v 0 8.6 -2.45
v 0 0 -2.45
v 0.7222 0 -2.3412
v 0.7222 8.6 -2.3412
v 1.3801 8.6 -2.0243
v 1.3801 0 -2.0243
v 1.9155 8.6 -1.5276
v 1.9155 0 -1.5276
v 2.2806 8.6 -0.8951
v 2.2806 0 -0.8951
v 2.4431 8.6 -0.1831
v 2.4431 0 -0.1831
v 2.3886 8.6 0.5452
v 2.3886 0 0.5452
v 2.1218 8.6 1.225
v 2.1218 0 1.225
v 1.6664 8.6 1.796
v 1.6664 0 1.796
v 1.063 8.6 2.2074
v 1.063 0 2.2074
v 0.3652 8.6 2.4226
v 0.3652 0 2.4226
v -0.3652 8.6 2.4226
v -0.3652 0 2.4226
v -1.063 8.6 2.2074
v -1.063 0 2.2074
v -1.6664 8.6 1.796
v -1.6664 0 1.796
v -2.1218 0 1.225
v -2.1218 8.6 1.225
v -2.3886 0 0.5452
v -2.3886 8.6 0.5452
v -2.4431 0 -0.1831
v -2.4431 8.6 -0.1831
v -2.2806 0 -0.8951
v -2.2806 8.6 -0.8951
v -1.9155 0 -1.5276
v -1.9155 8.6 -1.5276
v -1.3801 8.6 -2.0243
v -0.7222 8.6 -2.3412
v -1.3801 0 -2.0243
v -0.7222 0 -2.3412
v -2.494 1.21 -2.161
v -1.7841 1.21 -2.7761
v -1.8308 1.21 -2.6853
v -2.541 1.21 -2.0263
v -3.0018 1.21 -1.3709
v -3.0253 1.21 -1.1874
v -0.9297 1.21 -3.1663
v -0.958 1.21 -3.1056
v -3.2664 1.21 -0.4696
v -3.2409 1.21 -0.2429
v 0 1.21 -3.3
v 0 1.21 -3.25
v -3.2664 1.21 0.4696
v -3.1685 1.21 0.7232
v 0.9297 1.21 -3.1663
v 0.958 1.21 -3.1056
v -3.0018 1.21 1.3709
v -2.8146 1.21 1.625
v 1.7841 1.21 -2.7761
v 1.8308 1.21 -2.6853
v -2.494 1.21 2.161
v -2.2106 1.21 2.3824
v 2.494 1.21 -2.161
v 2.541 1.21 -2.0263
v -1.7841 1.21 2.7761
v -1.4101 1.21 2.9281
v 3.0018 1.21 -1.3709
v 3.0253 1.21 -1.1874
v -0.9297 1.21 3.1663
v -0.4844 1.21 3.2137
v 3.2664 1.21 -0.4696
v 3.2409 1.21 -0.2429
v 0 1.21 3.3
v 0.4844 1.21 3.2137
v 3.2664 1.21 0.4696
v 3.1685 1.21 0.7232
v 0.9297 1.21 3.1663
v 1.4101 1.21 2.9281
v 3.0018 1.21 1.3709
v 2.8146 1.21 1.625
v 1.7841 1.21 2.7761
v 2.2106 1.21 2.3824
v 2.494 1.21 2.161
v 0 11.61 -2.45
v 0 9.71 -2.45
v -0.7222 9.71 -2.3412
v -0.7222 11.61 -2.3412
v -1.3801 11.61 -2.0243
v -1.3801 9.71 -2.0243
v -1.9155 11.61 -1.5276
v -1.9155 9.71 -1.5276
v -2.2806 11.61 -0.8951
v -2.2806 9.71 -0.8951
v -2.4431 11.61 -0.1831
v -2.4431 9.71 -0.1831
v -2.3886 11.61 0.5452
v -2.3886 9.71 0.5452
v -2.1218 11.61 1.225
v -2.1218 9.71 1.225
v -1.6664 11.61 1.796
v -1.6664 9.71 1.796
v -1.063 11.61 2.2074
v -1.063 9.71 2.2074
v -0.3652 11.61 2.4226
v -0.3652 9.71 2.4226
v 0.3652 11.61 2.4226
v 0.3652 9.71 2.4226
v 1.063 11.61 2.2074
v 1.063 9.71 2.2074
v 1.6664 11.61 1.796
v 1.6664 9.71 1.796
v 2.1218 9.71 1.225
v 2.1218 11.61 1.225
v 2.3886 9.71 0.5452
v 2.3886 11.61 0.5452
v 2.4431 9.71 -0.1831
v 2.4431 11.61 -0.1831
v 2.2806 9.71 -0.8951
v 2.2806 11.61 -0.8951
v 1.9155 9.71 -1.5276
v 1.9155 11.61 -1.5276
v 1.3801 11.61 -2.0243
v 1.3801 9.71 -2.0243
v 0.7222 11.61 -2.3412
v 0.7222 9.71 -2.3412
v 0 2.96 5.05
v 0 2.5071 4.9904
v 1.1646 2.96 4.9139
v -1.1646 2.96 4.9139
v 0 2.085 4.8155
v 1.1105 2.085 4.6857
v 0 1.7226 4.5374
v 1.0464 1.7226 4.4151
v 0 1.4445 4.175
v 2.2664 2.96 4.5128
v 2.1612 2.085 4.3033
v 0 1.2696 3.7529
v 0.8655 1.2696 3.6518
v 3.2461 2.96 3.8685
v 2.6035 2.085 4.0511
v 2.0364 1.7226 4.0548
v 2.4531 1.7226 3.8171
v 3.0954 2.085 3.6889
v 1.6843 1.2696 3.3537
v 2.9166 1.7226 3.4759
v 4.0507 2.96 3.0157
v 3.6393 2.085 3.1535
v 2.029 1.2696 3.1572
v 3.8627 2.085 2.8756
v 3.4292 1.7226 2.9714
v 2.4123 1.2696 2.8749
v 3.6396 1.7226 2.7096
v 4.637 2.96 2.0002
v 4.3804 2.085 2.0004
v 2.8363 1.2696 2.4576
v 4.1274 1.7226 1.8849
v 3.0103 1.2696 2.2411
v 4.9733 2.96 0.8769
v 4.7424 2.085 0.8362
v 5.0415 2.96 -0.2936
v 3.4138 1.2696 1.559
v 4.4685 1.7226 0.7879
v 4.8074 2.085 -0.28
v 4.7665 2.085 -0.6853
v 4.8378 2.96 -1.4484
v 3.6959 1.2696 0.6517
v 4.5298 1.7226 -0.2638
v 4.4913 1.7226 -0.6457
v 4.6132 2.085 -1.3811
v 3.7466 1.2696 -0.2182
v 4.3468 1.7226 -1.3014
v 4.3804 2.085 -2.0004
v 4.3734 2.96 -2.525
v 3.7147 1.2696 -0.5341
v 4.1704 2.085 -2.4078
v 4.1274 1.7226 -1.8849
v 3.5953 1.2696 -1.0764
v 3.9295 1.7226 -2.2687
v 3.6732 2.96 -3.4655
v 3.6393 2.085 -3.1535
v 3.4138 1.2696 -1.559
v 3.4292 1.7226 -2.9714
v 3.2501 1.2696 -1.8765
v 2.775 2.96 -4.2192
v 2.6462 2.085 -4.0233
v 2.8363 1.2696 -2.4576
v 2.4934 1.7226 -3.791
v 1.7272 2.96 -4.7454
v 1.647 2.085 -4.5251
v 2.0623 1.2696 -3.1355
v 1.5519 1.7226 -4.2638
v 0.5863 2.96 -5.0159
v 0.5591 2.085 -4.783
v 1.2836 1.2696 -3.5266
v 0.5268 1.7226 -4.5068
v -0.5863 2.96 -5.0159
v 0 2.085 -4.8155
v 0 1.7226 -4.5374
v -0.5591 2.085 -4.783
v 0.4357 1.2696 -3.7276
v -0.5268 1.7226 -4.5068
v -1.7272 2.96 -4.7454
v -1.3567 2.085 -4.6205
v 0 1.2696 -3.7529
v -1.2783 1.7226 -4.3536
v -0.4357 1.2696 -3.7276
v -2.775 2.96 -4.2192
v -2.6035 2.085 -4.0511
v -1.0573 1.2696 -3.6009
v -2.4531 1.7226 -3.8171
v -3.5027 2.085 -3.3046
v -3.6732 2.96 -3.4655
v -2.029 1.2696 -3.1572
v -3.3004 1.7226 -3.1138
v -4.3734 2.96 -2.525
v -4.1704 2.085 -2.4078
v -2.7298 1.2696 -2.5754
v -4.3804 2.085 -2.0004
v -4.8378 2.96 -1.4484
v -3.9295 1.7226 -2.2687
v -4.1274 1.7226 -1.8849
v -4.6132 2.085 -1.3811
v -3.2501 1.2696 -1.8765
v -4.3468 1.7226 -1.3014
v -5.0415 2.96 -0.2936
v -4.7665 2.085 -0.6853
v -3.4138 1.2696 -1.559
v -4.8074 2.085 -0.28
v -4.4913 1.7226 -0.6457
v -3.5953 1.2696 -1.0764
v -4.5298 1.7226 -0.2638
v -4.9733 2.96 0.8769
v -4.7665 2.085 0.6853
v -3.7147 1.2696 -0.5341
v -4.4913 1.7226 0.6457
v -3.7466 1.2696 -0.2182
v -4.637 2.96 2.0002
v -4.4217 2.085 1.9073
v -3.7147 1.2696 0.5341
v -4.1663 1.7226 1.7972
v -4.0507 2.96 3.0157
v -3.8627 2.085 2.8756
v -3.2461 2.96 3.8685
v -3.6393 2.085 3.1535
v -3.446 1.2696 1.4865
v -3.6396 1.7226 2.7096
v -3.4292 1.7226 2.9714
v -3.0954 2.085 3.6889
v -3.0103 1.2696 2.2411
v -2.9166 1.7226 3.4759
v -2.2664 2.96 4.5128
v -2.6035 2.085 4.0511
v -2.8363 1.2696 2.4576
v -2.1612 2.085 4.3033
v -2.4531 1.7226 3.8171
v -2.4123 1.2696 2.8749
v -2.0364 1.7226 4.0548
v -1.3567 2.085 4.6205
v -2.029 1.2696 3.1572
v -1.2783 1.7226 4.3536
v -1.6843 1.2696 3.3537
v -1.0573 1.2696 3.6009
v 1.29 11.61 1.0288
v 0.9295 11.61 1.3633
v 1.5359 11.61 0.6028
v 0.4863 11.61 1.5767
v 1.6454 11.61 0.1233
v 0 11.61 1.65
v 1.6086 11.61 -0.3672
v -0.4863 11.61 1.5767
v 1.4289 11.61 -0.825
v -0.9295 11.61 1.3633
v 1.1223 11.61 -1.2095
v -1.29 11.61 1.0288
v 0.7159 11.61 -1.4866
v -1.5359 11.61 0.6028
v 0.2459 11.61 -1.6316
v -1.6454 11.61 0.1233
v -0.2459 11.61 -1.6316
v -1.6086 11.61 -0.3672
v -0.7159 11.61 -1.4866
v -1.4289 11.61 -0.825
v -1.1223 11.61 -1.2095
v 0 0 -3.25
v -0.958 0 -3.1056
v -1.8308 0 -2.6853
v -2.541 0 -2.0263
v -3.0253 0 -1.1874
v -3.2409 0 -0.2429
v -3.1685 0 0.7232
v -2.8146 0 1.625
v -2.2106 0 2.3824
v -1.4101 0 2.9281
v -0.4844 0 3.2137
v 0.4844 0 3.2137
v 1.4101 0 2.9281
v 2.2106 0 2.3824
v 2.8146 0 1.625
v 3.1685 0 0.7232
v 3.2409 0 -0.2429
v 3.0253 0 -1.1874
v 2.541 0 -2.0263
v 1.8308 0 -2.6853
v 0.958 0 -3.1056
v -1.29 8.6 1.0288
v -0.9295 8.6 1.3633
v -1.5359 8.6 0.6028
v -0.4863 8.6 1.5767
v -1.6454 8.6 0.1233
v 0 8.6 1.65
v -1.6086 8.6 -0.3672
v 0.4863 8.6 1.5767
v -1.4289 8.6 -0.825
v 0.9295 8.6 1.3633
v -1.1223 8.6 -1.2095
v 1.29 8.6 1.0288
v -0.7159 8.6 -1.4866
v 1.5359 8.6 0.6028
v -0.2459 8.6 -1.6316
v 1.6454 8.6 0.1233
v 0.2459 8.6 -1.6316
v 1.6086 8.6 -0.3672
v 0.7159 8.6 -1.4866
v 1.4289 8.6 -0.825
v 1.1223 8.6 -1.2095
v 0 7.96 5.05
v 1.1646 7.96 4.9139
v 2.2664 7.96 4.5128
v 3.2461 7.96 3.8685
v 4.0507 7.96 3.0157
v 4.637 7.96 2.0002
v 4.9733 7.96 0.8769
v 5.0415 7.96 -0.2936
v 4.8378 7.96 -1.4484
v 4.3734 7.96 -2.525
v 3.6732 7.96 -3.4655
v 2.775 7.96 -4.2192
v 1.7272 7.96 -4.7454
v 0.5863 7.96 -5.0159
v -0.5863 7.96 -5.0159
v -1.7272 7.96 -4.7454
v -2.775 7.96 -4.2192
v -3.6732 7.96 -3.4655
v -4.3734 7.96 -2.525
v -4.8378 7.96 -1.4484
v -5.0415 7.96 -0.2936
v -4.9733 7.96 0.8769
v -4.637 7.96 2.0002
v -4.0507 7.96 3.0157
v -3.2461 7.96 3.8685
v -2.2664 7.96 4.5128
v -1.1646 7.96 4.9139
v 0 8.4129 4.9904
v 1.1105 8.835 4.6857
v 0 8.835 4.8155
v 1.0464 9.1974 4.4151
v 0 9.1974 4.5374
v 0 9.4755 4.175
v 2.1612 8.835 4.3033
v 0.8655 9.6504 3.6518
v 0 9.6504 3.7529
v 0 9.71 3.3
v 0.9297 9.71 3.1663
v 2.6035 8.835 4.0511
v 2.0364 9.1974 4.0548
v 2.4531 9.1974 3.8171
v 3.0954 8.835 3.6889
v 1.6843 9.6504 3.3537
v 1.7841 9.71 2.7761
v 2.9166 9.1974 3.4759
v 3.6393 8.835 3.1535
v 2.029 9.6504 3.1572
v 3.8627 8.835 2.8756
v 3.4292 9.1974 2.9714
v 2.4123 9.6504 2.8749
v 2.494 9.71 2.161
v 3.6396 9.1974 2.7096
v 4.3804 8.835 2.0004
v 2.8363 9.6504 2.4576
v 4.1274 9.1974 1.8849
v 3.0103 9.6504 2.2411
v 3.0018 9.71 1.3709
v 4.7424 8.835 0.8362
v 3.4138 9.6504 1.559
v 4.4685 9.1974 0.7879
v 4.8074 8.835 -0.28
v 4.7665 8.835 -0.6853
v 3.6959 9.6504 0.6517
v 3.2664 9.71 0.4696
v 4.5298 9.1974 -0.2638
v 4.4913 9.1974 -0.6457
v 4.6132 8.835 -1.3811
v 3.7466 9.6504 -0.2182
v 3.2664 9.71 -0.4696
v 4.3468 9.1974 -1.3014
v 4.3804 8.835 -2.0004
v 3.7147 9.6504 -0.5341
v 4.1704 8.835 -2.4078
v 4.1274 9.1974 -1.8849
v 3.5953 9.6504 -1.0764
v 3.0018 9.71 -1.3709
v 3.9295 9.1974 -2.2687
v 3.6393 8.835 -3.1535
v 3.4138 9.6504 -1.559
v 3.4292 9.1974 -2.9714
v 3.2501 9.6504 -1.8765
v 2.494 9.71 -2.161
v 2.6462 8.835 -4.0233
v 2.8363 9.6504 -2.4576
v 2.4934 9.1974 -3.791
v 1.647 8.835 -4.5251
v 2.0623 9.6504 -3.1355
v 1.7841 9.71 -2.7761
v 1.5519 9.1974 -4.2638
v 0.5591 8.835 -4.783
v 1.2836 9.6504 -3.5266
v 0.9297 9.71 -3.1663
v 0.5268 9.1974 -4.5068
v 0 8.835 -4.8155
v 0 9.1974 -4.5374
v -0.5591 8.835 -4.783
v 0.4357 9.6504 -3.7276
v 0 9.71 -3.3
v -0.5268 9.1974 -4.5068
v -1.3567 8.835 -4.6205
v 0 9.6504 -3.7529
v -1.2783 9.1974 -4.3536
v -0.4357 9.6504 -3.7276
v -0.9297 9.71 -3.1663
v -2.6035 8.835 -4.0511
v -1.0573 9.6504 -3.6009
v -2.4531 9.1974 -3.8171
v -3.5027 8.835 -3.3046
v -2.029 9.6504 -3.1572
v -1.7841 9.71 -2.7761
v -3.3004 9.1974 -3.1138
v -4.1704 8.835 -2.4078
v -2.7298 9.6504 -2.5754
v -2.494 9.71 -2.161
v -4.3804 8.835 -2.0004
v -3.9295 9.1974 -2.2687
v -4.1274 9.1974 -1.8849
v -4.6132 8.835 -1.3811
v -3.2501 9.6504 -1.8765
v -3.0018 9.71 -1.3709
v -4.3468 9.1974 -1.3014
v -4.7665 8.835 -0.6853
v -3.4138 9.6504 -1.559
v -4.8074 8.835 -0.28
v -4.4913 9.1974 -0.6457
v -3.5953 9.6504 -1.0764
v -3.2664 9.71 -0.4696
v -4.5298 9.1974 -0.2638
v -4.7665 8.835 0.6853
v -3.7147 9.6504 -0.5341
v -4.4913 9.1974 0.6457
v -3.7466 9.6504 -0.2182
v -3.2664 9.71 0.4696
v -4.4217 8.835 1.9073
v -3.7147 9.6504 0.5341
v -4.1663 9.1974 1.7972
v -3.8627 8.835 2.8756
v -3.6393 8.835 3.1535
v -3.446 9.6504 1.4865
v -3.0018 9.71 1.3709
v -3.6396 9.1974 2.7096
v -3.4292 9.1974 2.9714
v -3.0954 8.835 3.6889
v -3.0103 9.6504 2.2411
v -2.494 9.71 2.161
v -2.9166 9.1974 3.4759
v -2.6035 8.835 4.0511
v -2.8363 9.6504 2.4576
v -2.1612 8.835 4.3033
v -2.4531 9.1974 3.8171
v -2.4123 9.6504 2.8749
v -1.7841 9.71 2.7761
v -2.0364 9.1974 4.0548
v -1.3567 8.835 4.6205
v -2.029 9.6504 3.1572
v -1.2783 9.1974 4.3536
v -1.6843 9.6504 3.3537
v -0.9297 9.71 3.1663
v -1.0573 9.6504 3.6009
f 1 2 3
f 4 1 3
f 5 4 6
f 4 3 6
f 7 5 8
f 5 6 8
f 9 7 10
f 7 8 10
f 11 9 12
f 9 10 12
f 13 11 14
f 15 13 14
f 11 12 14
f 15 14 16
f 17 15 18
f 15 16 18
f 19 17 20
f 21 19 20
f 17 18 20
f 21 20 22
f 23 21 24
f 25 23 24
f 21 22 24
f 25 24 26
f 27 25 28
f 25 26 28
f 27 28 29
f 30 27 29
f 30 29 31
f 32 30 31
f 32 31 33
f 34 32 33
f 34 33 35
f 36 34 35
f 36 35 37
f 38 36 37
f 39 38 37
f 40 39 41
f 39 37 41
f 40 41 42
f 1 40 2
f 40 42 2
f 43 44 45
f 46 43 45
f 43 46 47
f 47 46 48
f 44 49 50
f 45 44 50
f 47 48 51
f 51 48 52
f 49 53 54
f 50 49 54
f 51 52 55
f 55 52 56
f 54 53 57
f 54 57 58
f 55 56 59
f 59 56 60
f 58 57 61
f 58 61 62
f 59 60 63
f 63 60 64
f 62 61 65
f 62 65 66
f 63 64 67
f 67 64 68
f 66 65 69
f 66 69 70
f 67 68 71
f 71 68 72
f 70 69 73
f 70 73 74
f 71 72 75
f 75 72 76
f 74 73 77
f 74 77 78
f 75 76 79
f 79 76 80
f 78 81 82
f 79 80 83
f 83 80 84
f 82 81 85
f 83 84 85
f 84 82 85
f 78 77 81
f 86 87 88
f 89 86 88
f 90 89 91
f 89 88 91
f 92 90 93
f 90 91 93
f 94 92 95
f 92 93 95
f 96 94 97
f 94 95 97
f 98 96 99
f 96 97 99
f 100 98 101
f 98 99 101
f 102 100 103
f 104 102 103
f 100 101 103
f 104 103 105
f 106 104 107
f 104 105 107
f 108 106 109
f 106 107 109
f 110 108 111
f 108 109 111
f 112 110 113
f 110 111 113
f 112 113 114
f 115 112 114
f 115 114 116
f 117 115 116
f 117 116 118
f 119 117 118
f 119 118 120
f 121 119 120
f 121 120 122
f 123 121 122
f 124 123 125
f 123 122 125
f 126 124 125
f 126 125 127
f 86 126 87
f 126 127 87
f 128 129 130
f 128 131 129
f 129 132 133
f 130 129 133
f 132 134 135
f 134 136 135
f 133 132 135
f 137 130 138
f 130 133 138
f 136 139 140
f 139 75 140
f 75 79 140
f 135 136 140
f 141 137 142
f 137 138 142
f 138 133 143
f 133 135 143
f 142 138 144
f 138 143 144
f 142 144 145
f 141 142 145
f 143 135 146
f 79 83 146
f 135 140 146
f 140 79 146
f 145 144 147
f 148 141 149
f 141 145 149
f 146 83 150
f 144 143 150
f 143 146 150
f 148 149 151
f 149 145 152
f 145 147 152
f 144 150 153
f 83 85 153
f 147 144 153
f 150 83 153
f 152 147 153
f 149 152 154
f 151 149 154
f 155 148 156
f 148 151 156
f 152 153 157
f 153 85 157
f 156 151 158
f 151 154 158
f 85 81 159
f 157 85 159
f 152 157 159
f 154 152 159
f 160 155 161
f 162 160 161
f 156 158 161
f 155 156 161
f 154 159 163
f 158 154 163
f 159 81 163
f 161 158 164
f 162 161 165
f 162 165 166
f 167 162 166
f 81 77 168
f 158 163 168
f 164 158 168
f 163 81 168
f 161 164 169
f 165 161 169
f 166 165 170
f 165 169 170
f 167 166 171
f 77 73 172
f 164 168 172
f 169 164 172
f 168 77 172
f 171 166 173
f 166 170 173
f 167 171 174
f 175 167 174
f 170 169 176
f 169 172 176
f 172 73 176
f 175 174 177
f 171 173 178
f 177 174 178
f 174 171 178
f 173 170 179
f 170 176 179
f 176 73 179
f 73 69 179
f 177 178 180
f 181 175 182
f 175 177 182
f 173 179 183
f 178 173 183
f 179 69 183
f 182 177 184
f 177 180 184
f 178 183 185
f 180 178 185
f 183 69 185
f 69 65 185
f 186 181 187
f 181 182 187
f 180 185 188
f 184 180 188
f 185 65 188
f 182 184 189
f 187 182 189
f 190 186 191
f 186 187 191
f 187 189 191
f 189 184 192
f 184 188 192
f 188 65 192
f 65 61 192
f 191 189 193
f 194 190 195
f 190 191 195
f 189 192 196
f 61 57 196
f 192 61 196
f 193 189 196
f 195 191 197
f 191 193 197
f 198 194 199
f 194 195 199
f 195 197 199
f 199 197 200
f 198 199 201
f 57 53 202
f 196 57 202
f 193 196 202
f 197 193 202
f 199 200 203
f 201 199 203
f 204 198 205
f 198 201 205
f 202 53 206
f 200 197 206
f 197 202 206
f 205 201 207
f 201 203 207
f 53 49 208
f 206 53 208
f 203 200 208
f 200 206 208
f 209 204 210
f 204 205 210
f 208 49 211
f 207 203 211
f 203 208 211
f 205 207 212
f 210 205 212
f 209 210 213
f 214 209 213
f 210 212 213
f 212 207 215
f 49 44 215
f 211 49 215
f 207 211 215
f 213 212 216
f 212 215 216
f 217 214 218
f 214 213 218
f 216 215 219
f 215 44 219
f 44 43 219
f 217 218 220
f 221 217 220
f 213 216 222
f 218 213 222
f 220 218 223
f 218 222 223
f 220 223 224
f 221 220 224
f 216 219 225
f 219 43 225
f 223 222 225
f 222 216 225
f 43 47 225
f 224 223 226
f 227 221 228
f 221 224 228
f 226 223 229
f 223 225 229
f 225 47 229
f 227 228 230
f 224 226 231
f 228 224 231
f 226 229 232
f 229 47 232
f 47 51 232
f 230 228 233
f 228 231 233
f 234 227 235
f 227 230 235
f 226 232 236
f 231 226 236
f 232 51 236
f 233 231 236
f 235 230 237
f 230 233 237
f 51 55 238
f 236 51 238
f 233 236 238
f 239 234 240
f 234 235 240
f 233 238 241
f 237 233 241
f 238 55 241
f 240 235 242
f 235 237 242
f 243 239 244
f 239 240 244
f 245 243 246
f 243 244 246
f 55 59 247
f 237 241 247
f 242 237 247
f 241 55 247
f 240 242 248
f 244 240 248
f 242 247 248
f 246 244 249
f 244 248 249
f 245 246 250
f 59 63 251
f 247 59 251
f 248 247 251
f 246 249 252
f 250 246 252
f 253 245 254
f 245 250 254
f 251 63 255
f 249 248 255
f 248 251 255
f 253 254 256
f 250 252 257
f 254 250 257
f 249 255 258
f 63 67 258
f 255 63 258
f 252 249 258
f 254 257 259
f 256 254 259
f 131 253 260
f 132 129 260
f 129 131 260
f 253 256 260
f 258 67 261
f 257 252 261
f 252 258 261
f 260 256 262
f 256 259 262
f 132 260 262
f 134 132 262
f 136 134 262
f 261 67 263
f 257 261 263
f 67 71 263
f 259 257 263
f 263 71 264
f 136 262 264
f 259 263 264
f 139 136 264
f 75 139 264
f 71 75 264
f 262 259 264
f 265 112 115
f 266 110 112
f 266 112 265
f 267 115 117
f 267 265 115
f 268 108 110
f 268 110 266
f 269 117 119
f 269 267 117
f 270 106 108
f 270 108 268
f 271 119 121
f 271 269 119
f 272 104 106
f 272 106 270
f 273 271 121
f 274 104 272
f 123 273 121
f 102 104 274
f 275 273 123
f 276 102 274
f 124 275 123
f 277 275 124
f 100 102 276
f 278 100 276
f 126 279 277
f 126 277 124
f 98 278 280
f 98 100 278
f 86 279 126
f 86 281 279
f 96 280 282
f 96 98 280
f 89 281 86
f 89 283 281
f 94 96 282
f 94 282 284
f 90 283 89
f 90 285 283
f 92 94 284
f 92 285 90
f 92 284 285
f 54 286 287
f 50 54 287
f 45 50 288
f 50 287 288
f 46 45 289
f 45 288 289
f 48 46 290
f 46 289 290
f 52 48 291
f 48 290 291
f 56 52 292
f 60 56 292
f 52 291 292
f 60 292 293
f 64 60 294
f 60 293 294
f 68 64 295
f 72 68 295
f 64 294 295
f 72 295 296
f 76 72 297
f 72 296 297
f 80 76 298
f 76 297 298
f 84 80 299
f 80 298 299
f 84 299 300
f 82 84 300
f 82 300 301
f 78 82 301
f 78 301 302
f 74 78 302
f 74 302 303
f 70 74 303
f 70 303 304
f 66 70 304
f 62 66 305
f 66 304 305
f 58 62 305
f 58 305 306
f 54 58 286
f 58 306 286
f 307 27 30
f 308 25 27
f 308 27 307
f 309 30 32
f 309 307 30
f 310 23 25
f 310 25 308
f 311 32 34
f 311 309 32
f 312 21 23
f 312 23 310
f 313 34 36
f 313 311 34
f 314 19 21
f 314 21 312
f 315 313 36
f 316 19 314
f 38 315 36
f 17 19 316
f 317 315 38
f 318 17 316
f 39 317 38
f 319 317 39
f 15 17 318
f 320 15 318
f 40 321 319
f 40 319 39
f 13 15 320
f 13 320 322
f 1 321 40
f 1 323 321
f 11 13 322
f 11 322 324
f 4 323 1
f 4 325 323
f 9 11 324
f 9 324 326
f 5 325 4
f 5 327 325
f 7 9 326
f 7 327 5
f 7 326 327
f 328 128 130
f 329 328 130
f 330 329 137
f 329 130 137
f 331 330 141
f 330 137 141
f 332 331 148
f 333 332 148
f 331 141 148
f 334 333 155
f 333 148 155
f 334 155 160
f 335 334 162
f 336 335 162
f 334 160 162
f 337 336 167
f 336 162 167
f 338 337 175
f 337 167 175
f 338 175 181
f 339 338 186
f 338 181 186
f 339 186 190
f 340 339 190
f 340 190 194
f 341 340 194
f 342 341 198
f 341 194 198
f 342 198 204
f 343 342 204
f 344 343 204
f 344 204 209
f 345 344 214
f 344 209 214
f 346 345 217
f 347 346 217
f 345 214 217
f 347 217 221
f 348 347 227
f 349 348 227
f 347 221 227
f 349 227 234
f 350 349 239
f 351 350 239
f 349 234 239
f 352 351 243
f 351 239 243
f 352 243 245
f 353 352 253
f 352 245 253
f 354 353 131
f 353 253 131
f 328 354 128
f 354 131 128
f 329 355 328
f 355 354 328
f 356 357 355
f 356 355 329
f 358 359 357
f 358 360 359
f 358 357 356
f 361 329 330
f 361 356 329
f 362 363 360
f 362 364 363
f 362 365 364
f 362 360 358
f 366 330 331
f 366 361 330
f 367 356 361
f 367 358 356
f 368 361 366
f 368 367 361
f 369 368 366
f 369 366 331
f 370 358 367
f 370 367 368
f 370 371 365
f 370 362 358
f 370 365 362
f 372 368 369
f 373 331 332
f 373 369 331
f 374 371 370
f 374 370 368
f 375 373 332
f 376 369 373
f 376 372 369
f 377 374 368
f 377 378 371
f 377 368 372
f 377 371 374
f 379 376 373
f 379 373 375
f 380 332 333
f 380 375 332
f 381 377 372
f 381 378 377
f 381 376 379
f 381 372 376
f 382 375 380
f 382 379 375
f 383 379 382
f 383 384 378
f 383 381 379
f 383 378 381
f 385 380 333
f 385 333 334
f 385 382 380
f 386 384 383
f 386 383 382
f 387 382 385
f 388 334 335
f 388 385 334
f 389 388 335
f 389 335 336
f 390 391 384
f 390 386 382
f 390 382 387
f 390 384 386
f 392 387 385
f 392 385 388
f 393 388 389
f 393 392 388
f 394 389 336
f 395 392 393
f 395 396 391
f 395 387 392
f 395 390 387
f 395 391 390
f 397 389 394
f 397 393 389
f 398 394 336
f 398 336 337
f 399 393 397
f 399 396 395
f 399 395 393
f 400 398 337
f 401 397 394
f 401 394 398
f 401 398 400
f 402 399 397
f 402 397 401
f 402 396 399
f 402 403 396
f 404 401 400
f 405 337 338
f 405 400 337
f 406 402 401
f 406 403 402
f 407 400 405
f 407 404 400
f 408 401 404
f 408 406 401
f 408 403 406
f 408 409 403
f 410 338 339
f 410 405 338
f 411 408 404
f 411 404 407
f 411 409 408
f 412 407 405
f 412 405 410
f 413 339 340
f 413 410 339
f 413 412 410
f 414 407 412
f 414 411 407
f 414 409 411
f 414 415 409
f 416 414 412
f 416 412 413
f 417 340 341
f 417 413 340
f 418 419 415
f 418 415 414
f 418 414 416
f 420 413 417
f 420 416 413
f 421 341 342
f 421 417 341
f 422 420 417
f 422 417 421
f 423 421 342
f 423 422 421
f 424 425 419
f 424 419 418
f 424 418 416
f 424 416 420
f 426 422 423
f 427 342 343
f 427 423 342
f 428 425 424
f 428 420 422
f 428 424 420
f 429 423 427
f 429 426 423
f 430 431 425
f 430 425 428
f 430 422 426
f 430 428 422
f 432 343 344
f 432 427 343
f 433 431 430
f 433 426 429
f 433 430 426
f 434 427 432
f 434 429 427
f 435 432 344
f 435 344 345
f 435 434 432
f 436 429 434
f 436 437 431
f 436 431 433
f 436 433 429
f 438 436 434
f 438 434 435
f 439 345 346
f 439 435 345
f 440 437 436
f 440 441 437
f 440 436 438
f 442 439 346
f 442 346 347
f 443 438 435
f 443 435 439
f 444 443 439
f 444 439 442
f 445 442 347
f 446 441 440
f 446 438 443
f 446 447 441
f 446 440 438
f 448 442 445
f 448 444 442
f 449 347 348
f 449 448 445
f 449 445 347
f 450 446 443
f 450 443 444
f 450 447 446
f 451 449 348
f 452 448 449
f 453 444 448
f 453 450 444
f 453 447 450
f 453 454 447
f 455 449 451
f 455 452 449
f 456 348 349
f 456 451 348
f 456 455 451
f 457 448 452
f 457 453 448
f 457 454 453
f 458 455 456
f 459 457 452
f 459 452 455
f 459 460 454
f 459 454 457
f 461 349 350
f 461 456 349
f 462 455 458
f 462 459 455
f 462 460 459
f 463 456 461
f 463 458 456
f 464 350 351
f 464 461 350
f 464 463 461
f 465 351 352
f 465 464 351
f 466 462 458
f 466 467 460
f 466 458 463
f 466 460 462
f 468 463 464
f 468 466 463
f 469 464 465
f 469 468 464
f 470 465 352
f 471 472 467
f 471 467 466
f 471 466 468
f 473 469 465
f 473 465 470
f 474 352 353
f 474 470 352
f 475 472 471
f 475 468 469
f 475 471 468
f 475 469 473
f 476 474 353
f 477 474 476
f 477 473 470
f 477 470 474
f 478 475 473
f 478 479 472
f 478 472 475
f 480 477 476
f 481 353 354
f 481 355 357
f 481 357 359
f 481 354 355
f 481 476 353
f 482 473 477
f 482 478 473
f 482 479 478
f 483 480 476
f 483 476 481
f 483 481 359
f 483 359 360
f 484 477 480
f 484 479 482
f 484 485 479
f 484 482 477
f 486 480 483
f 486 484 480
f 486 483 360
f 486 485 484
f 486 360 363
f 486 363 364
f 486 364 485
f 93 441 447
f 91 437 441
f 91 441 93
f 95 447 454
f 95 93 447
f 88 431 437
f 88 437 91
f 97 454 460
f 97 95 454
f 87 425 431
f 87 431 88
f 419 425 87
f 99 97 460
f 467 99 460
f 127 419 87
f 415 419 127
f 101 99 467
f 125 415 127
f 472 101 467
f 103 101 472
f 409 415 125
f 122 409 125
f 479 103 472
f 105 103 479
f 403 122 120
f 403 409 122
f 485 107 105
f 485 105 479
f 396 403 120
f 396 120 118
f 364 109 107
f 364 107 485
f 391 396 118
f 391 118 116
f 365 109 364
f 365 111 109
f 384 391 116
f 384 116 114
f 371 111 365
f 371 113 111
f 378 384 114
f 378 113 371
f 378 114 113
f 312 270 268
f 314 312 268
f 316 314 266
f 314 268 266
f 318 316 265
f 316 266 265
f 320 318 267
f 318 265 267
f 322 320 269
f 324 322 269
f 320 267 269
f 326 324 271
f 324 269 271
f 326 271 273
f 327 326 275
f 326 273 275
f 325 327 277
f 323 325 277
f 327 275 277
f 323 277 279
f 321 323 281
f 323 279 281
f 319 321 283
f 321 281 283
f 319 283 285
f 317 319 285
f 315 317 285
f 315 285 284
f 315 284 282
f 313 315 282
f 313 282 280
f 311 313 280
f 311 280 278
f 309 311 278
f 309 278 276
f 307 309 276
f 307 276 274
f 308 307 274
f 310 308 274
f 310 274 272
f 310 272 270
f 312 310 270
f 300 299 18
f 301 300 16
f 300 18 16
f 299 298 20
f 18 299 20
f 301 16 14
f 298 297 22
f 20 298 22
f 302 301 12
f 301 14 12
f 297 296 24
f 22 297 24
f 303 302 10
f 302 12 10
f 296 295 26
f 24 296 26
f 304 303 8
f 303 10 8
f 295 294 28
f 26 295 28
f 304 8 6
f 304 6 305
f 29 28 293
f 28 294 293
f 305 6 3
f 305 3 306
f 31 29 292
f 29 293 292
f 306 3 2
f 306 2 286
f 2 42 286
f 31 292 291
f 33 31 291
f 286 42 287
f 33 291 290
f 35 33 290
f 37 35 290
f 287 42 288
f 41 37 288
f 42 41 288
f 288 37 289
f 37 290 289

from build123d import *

# Parameters (mm, degrees)
SKETCH1_R           = 3.25
BOSS_EXTRUDE1_DEPTH = 1.21
SKETCH2_R           = 5.05
BOSS_EXTRUDE2_DEPTH = 8.5
SKETCH3_R           = 2.45
BOSS_EXTRUDE3_DEPTH = 1.9
FILLET1_R           = 1.75
FILLET2_R           = 1.75
SKETCH4_R           = 1.65
CUT_EXTRUDE1_DEPTH  = 14.630740992
SKETCH5_R           = 2.45
CUT_EXTRUDE3_DEPTH  = 8.6


with BuildPart() as part:
    # Sketch1 → Boss-Extrude1 (new body)
    with BuildSketch(Plane(origin=(0, 0, 0), x_dir=(1, 0, 0), z_dir=(0, 1, 0))):
        with Locations(Location((0, 0, 0), (0, 0, 90))):
            Circle(SKETCH1_R)
    extrude(amount=BOSS_EXTRUDE1_DEPTH)

    # Sketch2 → Boss-Extrude2 (add)
    with BuildSketch(Plane(origin=(0, 1.21, 0), x_dir=(1, 0, 0), z_dir=(0, 1, 0))):
        with Locations(Location((0, 0, 0), (0, 0, 270))):
            Circle(SKETCH2_R)
    extrude(amount=BOSS_EXTRUDE2_DEPTH)

    # Sketch3 → Boss-Extrude3 (add)
    with BuildSketch(Plane(origin=(0, 9.71, 0), x_dir=(1, 0, 0), z_dir=(0, 1, 0))):
        with Locations(Location((0, 0, 0), (0, 0, 90))):
            Circle(SKETCH3_R)
    extrude(amount=BOSS_EXTRUDE3_DEPTH)

    # Fillet1
    fillet1_edges = [part.edges().sort_by_distance(p)[0] for p in [
        (0, 9.71, -5.05),
    ]]
    fillet(fillet1_edges, radius=FILLET1_R)

    # Fillet2
    fillet2_edges = [part.edges().sort_by_distance(p)[0] for p in [
        (0, 1.21, -5.05),
    ]]
    fillet(fillet2_edges, radius=FILLET2_R)

    # Sketch4 → Cut-Extrude1 (cut, through all)
    with BuildSketch(Plane(origin=(0, 11.61, 0), x_dir=(1, 0, 0), z_dir=(0, 1, 0))):
        with Locations(Location((0, 0, 0), (0, 0, 270))):
            Circle(SKETCH4_R)
    extrude(amount=-CUT_EXTRUDE1_DEPTH, mode=Mode.SUBTRACT)

    # Sketch5 → Cut-Extrude3 (cut)
    with BuildSketch(Plane.XZ):
        with Locations(Location((0, 0, 0), (0, 0, 270))):
            Circle(SKETCH5_R)
    extrude(amount=-CUT_EXTRUDE3_DEPTH, mode=Mode.SUBTRACT)


solid = part.part
